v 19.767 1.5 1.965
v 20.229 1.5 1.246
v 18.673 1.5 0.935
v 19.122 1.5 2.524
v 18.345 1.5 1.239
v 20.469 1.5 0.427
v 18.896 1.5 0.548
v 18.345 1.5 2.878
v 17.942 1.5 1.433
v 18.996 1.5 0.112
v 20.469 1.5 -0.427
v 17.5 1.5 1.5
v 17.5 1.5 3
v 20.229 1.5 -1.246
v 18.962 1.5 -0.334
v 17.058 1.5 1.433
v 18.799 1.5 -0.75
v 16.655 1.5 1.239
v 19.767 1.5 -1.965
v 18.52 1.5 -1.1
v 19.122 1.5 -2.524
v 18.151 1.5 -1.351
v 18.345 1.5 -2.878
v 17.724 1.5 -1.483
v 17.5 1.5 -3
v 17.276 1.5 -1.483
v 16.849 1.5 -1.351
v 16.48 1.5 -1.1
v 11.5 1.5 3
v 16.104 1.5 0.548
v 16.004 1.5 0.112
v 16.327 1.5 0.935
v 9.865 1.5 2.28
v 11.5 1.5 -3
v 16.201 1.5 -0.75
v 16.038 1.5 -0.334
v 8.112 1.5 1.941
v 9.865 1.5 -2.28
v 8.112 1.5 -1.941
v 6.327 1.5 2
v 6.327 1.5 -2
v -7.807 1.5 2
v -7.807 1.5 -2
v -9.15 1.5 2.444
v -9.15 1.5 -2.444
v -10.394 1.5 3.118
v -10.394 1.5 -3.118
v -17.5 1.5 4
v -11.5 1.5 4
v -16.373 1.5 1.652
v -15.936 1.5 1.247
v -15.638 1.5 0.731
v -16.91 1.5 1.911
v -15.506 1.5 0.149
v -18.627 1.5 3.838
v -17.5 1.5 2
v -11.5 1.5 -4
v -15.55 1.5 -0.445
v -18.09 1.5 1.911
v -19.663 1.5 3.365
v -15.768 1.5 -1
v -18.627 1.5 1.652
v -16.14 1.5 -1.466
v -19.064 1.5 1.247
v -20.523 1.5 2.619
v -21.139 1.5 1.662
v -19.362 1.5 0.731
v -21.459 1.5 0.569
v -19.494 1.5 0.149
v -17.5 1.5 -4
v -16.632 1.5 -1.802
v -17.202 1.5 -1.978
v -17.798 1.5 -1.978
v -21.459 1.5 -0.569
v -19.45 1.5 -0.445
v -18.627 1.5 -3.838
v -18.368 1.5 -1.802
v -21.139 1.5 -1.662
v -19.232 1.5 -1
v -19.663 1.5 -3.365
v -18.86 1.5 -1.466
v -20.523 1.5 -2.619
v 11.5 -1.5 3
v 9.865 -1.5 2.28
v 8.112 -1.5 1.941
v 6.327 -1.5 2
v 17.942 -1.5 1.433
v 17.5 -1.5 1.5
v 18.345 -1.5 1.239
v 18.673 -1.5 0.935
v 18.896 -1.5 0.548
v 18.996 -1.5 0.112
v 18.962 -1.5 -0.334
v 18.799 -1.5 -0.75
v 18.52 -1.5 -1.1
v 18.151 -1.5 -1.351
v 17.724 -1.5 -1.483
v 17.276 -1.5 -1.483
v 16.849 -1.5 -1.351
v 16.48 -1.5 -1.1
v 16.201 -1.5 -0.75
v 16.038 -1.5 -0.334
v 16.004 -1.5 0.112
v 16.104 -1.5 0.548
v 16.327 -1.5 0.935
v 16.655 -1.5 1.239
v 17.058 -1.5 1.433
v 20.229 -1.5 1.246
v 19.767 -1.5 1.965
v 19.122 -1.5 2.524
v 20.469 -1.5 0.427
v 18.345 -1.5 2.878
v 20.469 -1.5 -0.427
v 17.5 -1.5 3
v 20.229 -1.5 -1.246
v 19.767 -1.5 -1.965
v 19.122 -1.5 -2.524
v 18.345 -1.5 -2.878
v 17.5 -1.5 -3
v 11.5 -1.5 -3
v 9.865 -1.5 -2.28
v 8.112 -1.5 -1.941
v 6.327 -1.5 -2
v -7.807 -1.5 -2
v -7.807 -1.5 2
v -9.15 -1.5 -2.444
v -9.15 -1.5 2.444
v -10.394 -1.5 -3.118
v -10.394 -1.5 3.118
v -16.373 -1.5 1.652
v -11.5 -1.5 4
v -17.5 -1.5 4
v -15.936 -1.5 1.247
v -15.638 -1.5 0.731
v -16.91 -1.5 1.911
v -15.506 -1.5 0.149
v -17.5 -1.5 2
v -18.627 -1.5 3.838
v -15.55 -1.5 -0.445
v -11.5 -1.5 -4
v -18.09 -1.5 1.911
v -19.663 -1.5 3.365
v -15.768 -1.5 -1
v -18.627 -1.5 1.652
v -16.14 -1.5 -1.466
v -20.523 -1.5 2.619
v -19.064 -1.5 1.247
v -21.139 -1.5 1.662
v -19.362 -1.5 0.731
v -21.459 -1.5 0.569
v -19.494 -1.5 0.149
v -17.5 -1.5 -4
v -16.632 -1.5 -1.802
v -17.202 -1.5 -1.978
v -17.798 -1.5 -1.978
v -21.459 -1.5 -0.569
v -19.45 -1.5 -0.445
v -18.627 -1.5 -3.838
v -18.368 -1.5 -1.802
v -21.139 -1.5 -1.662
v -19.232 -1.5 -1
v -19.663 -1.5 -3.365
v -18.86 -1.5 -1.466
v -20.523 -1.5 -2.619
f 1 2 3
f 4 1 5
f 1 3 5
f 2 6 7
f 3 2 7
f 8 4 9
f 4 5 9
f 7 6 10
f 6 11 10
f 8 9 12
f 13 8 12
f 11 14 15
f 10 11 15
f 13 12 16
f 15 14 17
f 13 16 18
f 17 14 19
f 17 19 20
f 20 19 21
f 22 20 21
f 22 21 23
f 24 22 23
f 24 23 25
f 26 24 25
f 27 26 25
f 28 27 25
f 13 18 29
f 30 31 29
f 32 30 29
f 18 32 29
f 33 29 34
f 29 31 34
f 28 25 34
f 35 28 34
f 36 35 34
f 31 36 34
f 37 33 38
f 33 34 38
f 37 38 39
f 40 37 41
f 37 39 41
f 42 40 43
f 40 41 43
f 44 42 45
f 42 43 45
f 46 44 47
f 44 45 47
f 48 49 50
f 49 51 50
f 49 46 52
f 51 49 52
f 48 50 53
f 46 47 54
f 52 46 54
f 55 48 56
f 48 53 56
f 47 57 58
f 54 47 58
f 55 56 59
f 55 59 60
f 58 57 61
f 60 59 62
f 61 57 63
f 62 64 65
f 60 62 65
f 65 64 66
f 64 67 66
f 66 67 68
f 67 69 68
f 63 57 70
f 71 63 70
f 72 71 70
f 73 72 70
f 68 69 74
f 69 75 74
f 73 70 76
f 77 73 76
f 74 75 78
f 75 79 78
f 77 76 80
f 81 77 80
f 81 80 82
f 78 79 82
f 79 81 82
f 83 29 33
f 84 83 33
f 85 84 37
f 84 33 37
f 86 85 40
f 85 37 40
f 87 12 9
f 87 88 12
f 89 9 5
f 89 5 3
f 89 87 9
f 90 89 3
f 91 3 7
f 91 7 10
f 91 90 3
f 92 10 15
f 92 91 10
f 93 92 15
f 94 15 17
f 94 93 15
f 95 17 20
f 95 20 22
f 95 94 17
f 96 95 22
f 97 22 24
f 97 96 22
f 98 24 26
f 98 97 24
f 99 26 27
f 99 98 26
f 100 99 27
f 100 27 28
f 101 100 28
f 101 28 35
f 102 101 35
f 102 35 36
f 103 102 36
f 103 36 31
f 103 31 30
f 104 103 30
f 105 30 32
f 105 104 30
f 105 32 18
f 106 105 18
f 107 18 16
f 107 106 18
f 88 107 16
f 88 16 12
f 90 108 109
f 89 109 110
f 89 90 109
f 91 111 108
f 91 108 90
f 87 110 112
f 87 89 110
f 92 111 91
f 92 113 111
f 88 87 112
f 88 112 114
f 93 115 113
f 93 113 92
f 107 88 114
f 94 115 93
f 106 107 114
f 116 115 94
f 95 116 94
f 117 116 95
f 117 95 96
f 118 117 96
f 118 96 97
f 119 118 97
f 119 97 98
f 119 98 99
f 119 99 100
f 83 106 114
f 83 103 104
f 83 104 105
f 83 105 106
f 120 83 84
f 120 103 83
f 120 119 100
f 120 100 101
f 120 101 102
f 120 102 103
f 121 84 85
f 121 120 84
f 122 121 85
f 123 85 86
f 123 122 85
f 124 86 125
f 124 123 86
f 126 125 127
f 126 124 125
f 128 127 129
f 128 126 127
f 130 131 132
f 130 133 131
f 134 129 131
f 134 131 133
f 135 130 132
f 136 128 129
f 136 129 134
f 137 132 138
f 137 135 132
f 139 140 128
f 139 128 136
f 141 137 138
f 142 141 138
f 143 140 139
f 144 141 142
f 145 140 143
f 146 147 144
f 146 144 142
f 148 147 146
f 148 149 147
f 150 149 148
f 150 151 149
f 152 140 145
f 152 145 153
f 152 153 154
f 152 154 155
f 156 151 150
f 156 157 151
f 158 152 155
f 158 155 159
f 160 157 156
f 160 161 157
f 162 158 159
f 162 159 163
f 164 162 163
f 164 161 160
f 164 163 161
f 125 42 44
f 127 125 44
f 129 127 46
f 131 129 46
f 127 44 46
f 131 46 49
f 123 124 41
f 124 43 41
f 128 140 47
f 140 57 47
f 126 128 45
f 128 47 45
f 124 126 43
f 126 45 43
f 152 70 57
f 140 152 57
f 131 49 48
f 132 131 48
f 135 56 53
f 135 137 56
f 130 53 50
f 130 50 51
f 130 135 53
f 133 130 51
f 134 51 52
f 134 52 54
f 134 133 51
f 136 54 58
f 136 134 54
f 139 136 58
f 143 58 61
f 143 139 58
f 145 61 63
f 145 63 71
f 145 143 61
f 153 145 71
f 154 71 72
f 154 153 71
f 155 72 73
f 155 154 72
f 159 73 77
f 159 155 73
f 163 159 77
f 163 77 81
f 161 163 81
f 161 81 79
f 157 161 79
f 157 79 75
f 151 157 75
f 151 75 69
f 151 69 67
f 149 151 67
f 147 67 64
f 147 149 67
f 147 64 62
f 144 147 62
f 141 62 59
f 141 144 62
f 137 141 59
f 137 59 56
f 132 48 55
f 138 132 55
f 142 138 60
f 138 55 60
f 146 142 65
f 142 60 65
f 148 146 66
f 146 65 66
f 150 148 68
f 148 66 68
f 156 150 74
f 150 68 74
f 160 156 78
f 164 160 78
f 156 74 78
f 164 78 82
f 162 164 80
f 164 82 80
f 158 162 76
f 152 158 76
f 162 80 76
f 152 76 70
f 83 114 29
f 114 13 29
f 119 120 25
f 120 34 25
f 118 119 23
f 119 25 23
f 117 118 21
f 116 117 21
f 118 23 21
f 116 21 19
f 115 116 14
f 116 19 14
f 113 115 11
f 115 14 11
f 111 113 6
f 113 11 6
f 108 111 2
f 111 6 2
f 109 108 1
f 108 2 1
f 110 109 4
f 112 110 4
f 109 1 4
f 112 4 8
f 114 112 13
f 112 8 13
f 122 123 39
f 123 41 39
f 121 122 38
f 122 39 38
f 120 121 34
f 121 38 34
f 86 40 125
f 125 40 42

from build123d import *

# Parameters (mm, degrees)
SKETCH1_R           = 1.5
SKETCH1_R_2         = 2
BOSS_EXTRUDE1_DEPTH = 1.5


with BuildPart() as part:
    # Sketch1 → Boss-Extrude1 (new, symmetric)
    with BuildSketch(Plane(origin=(0, 0, 0), x_dir=(1, 0, 0), z_dir=(0, 1, 0))):
        with BuildLine():
            Line((-17.5, 4), (-11.5, 4))
            ThreePointArc((-11.5, 4), (-9.787250471, 2.753376432), (-7.807350165, 2))
            Line((-7.807350165, 2), (6.326731681, 2))
            ThreePointArc((6.326731681, 2), (8.998056486, 2.061872567), (11.5, 3))
            Line((11.5, 3), (17.5, 3))
            ThreePointArc((17.5, 3), (20.5, 0), (17.5, -3))
            Line((17.5, -3), (11.5, -3))
            ThreePointArc((11.5, -3), (8.998056486, -2.061872567), (6.326731681, -2))
            Line((6.326731681, -2), (-7.807350165, -2))
            ThreePointArc((-7.807350165, -2), (-9.787250471, -2.753376432), (-11.5, -4))
            Line((-11.5, -4), (-17.5, -4))
            ThreePointArc((-17.5, -4), (-21.5, 0), (-17.5, 4))
        make_face()
        with Locations(Location((17.5, 0, 0), (0, 0, 270))):
            Circle(SKETCH1_R, mode=Mode.SUBTRACT)
        with Locations(Location((-17.5, 0, 0), (0, 0, 270))):
            Circle(SKETCH1_R_2, mode=Mode.SUBTRACT)
    extrude(amount=BOSS_EXTRUDE1_DEPTH, both=True)


solid = part.part
